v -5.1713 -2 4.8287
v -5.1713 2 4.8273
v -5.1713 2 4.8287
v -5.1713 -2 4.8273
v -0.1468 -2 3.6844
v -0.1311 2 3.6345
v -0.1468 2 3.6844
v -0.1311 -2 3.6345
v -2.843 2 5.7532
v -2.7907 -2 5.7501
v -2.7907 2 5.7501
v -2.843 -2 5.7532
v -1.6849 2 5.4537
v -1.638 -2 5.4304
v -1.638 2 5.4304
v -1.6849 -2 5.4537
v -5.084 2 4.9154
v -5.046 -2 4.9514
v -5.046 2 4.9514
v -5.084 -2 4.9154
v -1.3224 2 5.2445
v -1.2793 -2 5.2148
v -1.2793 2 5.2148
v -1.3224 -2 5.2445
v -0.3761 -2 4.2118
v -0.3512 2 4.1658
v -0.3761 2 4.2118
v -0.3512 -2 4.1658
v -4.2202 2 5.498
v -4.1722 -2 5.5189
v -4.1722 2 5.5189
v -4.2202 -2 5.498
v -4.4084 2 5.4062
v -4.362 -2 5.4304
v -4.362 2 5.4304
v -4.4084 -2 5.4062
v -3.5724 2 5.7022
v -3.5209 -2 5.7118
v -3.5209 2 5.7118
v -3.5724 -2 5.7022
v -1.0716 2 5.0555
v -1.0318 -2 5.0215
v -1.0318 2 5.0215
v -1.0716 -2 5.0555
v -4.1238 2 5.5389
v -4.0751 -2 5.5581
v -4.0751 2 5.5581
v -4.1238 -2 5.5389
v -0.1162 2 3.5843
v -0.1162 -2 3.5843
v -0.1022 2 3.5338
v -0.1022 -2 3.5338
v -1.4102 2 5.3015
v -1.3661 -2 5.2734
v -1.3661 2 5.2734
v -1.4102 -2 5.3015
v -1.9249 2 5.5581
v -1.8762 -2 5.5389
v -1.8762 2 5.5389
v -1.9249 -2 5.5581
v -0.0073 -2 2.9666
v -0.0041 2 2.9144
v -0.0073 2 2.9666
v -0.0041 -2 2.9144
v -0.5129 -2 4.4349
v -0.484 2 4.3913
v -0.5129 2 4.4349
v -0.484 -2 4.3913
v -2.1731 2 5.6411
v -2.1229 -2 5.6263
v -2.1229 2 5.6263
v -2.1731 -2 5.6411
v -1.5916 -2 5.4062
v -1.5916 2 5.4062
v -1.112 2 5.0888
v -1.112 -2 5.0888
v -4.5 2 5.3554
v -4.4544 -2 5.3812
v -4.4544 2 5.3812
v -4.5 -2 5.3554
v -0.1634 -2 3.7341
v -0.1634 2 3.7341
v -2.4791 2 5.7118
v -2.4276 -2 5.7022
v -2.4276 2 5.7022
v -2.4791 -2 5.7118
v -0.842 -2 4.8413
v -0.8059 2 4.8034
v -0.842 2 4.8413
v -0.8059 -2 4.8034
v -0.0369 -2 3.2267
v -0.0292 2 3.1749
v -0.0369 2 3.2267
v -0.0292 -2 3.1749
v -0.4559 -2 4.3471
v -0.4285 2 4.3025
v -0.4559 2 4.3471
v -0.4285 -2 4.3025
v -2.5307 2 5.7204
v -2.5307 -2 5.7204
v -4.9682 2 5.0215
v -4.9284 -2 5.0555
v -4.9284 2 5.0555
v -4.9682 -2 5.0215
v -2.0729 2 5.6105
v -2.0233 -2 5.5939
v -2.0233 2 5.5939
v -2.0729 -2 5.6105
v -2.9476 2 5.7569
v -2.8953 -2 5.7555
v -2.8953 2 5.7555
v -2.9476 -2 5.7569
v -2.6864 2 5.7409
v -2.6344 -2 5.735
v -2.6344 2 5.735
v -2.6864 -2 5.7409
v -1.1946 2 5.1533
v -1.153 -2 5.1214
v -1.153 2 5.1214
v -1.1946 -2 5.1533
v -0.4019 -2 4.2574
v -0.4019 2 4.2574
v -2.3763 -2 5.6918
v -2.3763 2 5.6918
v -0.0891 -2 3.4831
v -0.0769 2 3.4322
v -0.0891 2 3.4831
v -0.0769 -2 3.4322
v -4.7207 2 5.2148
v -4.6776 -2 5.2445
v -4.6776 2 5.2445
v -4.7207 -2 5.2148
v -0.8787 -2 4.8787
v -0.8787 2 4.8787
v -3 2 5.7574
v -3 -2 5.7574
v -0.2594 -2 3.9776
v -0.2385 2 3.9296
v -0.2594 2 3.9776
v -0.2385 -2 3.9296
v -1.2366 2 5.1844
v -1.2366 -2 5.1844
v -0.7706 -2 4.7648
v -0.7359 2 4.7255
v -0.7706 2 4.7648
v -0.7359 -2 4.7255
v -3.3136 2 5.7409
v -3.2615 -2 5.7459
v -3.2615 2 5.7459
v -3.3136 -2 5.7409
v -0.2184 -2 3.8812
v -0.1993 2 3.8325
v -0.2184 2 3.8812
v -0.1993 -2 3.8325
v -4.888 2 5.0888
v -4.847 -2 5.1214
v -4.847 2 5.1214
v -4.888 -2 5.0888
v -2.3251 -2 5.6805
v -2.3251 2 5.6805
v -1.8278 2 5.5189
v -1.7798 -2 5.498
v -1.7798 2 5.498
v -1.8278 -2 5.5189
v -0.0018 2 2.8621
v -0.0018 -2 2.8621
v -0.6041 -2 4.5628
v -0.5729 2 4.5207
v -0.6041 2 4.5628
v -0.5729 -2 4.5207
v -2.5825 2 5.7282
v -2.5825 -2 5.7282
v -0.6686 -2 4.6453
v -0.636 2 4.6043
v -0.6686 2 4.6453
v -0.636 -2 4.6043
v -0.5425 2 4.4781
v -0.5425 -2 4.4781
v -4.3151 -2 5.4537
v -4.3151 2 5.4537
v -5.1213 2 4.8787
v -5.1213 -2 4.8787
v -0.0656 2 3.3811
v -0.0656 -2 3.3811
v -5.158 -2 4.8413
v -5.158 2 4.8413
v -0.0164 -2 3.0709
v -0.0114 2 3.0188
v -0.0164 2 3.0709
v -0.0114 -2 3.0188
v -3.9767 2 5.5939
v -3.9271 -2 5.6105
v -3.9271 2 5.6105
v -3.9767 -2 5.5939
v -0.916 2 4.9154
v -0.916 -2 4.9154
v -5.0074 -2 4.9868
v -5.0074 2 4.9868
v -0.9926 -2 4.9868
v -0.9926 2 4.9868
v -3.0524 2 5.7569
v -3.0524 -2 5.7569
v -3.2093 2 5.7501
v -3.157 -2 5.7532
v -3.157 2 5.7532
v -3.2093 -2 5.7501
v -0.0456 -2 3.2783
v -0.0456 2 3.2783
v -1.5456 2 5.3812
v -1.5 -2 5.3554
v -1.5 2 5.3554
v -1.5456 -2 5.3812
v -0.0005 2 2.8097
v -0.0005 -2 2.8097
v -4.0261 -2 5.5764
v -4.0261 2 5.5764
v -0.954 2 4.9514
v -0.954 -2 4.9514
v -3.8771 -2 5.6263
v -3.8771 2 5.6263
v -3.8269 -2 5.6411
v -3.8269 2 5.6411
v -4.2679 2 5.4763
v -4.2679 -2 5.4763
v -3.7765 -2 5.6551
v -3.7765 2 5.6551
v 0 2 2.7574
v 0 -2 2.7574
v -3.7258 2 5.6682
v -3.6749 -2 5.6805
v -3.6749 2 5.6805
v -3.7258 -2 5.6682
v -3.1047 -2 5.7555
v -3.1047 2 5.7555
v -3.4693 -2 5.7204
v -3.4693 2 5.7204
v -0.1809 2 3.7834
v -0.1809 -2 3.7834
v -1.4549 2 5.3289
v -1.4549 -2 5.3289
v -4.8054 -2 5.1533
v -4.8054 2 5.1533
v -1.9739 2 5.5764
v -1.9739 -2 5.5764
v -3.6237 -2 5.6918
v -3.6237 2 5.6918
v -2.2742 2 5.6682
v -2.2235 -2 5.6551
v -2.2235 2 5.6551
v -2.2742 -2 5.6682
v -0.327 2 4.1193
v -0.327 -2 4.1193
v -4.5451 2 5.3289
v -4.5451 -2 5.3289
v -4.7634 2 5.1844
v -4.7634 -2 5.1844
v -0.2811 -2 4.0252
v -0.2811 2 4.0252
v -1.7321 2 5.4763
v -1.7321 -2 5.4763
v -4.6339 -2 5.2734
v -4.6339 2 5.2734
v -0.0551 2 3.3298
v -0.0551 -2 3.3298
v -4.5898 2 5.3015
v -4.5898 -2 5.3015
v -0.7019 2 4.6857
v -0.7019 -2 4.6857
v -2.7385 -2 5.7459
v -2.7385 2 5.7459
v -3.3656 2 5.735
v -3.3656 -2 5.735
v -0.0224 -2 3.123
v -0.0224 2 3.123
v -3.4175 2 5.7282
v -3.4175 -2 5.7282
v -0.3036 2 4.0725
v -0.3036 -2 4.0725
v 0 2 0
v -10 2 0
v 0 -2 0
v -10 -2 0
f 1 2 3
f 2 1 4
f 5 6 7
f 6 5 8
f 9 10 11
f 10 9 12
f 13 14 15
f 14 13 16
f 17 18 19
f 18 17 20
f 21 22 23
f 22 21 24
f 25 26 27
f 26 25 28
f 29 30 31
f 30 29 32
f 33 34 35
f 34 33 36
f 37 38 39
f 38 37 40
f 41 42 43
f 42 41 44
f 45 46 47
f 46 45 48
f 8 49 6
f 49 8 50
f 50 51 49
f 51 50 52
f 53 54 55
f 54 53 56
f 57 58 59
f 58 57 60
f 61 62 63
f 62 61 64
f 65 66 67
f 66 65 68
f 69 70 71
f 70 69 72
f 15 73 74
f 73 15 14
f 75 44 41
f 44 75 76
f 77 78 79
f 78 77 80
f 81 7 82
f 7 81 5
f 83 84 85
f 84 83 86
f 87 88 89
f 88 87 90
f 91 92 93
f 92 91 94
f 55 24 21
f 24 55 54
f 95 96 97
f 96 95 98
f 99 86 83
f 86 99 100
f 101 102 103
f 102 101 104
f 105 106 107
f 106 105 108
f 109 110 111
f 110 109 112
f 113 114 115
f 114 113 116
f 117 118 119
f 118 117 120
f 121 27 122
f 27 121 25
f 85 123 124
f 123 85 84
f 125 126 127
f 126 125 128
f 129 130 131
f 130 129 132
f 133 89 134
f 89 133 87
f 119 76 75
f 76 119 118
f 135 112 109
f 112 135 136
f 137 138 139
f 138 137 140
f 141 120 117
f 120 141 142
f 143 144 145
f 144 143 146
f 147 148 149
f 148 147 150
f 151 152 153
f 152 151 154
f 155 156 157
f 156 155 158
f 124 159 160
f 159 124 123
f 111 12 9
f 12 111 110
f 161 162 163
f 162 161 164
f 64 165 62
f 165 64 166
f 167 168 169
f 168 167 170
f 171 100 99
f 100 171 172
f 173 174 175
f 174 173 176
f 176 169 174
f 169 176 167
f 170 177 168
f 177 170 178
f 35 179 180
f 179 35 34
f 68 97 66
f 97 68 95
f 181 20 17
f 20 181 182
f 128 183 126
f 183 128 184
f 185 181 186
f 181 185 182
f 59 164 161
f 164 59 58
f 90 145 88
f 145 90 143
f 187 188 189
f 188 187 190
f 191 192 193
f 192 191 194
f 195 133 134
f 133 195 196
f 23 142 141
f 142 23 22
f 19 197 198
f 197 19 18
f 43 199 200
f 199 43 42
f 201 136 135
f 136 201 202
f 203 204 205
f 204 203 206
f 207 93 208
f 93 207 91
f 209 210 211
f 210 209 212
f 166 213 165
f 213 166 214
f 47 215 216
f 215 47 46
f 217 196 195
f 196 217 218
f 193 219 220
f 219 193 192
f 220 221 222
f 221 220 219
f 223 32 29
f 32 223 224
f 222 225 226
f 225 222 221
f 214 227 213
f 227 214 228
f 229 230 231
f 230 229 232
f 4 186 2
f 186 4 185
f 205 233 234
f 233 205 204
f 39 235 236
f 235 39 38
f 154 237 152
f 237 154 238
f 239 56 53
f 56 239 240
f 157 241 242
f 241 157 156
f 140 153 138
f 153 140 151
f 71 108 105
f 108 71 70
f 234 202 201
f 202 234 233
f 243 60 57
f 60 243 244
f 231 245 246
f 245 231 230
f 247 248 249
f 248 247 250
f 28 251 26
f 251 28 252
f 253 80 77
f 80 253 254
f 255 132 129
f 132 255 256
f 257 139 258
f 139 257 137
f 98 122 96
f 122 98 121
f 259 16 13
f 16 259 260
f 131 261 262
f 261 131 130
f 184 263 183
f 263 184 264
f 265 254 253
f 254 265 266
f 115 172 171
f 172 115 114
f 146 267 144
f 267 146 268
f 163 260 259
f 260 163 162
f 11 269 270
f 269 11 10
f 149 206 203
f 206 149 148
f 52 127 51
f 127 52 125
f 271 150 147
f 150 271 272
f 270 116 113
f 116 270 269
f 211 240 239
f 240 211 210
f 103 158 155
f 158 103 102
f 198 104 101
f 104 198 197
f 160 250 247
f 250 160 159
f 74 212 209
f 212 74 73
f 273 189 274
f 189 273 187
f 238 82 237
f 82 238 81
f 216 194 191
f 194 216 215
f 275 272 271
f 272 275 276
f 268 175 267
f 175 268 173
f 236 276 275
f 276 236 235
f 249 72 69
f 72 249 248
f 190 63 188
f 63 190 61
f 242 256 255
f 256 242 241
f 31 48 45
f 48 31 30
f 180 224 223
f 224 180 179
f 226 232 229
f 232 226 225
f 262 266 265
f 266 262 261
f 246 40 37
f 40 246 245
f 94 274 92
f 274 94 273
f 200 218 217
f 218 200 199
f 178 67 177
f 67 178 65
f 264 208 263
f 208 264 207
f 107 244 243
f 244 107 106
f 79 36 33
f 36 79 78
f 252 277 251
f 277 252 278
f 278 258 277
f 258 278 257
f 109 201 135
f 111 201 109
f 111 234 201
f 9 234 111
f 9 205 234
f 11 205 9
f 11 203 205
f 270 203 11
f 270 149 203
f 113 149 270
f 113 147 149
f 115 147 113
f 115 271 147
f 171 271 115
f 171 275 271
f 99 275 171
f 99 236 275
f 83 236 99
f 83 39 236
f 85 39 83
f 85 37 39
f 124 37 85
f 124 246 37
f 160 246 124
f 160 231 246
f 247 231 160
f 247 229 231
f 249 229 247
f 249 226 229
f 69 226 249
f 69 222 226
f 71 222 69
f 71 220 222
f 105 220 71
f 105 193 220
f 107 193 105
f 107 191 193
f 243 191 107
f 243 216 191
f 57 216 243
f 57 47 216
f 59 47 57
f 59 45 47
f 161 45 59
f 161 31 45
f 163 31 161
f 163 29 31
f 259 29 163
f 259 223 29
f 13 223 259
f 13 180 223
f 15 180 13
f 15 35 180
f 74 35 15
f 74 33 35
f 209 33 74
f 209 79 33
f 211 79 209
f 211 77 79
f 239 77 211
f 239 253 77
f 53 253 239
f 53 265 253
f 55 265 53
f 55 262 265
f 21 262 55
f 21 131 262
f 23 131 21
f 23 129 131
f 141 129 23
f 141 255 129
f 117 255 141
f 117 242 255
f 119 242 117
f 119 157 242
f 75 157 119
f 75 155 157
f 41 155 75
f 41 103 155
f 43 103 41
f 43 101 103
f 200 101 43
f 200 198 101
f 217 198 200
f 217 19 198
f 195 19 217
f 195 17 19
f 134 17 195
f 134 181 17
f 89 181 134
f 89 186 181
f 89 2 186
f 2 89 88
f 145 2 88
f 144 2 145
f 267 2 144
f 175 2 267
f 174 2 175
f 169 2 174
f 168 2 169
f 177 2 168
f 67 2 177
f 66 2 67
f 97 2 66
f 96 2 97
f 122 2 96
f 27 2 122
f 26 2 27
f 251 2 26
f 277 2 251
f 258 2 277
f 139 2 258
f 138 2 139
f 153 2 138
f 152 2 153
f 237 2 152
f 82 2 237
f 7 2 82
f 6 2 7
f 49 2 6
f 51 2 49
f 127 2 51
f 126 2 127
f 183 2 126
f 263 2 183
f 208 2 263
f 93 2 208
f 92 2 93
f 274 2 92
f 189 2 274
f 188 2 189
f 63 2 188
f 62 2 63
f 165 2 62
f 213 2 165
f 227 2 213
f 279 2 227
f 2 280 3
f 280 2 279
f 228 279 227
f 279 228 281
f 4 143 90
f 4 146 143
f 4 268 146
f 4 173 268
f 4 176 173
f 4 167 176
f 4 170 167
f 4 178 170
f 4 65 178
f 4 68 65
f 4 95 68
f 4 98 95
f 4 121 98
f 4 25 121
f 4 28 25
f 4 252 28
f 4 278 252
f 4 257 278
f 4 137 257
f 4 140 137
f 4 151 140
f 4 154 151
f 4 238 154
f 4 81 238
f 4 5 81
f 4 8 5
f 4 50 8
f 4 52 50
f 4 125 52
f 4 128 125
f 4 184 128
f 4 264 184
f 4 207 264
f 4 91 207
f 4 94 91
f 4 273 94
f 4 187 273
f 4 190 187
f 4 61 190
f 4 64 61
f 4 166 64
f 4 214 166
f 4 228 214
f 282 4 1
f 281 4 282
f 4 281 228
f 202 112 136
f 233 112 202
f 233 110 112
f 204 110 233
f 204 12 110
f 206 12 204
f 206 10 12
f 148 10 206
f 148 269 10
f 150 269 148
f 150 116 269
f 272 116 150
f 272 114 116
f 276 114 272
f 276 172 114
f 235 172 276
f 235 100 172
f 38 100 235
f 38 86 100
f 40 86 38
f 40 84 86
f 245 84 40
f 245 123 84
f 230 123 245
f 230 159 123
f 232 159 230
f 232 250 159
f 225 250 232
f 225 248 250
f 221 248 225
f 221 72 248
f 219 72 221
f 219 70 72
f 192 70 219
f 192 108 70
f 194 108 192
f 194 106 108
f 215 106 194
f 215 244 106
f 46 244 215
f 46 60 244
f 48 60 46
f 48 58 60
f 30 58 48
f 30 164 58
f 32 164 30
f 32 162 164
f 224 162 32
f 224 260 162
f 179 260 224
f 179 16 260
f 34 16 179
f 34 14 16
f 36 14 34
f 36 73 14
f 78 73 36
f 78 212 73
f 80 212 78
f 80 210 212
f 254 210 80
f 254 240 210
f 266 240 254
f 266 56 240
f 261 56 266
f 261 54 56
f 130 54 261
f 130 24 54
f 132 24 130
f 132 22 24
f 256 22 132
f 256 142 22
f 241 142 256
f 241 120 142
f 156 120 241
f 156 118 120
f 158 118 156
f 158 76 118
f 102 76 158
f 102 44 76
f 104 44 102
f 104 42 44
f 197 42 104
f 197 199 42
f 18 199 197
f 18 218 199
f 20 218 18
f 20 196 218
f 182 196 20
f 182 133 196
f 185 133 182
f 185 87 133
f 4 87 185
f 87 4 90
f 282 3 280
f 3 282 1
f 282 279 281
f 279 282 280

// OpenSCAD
pad = 0.1;	// Padding to maintain manifold
b = 10;
h = 10;
w = 4;
r = 3;	// Radius of round
smooth = 360;	// Number of facets of rounding cylinder

z = h - r*h/b - r*pow(pow(h,2)+pow(b,2),0.5)/b;
x3 = r*h/pow(pow(h,2)+pow(b,2),0.5) + r;

difference() {
	rotate(a=[90,-90,0])
		linear_extrude(height = w, center = true, convexity = 10, twist = 0)
			polygon(points=[[0,0],[h,0],[0,b]], paths=[[0,1,2]]);
	translate([0,0,z])
		difference() {
			translate([-x3/2,0,(h-z)/2])
				cube([x3+pad,w+2*pad,h-z],center=true);
			translate([-r,0,0])
				rotate(a=[0,90,90])
					cylinder(w+4*pad,r,r,center=true,$fn=smooth);
		}
}
